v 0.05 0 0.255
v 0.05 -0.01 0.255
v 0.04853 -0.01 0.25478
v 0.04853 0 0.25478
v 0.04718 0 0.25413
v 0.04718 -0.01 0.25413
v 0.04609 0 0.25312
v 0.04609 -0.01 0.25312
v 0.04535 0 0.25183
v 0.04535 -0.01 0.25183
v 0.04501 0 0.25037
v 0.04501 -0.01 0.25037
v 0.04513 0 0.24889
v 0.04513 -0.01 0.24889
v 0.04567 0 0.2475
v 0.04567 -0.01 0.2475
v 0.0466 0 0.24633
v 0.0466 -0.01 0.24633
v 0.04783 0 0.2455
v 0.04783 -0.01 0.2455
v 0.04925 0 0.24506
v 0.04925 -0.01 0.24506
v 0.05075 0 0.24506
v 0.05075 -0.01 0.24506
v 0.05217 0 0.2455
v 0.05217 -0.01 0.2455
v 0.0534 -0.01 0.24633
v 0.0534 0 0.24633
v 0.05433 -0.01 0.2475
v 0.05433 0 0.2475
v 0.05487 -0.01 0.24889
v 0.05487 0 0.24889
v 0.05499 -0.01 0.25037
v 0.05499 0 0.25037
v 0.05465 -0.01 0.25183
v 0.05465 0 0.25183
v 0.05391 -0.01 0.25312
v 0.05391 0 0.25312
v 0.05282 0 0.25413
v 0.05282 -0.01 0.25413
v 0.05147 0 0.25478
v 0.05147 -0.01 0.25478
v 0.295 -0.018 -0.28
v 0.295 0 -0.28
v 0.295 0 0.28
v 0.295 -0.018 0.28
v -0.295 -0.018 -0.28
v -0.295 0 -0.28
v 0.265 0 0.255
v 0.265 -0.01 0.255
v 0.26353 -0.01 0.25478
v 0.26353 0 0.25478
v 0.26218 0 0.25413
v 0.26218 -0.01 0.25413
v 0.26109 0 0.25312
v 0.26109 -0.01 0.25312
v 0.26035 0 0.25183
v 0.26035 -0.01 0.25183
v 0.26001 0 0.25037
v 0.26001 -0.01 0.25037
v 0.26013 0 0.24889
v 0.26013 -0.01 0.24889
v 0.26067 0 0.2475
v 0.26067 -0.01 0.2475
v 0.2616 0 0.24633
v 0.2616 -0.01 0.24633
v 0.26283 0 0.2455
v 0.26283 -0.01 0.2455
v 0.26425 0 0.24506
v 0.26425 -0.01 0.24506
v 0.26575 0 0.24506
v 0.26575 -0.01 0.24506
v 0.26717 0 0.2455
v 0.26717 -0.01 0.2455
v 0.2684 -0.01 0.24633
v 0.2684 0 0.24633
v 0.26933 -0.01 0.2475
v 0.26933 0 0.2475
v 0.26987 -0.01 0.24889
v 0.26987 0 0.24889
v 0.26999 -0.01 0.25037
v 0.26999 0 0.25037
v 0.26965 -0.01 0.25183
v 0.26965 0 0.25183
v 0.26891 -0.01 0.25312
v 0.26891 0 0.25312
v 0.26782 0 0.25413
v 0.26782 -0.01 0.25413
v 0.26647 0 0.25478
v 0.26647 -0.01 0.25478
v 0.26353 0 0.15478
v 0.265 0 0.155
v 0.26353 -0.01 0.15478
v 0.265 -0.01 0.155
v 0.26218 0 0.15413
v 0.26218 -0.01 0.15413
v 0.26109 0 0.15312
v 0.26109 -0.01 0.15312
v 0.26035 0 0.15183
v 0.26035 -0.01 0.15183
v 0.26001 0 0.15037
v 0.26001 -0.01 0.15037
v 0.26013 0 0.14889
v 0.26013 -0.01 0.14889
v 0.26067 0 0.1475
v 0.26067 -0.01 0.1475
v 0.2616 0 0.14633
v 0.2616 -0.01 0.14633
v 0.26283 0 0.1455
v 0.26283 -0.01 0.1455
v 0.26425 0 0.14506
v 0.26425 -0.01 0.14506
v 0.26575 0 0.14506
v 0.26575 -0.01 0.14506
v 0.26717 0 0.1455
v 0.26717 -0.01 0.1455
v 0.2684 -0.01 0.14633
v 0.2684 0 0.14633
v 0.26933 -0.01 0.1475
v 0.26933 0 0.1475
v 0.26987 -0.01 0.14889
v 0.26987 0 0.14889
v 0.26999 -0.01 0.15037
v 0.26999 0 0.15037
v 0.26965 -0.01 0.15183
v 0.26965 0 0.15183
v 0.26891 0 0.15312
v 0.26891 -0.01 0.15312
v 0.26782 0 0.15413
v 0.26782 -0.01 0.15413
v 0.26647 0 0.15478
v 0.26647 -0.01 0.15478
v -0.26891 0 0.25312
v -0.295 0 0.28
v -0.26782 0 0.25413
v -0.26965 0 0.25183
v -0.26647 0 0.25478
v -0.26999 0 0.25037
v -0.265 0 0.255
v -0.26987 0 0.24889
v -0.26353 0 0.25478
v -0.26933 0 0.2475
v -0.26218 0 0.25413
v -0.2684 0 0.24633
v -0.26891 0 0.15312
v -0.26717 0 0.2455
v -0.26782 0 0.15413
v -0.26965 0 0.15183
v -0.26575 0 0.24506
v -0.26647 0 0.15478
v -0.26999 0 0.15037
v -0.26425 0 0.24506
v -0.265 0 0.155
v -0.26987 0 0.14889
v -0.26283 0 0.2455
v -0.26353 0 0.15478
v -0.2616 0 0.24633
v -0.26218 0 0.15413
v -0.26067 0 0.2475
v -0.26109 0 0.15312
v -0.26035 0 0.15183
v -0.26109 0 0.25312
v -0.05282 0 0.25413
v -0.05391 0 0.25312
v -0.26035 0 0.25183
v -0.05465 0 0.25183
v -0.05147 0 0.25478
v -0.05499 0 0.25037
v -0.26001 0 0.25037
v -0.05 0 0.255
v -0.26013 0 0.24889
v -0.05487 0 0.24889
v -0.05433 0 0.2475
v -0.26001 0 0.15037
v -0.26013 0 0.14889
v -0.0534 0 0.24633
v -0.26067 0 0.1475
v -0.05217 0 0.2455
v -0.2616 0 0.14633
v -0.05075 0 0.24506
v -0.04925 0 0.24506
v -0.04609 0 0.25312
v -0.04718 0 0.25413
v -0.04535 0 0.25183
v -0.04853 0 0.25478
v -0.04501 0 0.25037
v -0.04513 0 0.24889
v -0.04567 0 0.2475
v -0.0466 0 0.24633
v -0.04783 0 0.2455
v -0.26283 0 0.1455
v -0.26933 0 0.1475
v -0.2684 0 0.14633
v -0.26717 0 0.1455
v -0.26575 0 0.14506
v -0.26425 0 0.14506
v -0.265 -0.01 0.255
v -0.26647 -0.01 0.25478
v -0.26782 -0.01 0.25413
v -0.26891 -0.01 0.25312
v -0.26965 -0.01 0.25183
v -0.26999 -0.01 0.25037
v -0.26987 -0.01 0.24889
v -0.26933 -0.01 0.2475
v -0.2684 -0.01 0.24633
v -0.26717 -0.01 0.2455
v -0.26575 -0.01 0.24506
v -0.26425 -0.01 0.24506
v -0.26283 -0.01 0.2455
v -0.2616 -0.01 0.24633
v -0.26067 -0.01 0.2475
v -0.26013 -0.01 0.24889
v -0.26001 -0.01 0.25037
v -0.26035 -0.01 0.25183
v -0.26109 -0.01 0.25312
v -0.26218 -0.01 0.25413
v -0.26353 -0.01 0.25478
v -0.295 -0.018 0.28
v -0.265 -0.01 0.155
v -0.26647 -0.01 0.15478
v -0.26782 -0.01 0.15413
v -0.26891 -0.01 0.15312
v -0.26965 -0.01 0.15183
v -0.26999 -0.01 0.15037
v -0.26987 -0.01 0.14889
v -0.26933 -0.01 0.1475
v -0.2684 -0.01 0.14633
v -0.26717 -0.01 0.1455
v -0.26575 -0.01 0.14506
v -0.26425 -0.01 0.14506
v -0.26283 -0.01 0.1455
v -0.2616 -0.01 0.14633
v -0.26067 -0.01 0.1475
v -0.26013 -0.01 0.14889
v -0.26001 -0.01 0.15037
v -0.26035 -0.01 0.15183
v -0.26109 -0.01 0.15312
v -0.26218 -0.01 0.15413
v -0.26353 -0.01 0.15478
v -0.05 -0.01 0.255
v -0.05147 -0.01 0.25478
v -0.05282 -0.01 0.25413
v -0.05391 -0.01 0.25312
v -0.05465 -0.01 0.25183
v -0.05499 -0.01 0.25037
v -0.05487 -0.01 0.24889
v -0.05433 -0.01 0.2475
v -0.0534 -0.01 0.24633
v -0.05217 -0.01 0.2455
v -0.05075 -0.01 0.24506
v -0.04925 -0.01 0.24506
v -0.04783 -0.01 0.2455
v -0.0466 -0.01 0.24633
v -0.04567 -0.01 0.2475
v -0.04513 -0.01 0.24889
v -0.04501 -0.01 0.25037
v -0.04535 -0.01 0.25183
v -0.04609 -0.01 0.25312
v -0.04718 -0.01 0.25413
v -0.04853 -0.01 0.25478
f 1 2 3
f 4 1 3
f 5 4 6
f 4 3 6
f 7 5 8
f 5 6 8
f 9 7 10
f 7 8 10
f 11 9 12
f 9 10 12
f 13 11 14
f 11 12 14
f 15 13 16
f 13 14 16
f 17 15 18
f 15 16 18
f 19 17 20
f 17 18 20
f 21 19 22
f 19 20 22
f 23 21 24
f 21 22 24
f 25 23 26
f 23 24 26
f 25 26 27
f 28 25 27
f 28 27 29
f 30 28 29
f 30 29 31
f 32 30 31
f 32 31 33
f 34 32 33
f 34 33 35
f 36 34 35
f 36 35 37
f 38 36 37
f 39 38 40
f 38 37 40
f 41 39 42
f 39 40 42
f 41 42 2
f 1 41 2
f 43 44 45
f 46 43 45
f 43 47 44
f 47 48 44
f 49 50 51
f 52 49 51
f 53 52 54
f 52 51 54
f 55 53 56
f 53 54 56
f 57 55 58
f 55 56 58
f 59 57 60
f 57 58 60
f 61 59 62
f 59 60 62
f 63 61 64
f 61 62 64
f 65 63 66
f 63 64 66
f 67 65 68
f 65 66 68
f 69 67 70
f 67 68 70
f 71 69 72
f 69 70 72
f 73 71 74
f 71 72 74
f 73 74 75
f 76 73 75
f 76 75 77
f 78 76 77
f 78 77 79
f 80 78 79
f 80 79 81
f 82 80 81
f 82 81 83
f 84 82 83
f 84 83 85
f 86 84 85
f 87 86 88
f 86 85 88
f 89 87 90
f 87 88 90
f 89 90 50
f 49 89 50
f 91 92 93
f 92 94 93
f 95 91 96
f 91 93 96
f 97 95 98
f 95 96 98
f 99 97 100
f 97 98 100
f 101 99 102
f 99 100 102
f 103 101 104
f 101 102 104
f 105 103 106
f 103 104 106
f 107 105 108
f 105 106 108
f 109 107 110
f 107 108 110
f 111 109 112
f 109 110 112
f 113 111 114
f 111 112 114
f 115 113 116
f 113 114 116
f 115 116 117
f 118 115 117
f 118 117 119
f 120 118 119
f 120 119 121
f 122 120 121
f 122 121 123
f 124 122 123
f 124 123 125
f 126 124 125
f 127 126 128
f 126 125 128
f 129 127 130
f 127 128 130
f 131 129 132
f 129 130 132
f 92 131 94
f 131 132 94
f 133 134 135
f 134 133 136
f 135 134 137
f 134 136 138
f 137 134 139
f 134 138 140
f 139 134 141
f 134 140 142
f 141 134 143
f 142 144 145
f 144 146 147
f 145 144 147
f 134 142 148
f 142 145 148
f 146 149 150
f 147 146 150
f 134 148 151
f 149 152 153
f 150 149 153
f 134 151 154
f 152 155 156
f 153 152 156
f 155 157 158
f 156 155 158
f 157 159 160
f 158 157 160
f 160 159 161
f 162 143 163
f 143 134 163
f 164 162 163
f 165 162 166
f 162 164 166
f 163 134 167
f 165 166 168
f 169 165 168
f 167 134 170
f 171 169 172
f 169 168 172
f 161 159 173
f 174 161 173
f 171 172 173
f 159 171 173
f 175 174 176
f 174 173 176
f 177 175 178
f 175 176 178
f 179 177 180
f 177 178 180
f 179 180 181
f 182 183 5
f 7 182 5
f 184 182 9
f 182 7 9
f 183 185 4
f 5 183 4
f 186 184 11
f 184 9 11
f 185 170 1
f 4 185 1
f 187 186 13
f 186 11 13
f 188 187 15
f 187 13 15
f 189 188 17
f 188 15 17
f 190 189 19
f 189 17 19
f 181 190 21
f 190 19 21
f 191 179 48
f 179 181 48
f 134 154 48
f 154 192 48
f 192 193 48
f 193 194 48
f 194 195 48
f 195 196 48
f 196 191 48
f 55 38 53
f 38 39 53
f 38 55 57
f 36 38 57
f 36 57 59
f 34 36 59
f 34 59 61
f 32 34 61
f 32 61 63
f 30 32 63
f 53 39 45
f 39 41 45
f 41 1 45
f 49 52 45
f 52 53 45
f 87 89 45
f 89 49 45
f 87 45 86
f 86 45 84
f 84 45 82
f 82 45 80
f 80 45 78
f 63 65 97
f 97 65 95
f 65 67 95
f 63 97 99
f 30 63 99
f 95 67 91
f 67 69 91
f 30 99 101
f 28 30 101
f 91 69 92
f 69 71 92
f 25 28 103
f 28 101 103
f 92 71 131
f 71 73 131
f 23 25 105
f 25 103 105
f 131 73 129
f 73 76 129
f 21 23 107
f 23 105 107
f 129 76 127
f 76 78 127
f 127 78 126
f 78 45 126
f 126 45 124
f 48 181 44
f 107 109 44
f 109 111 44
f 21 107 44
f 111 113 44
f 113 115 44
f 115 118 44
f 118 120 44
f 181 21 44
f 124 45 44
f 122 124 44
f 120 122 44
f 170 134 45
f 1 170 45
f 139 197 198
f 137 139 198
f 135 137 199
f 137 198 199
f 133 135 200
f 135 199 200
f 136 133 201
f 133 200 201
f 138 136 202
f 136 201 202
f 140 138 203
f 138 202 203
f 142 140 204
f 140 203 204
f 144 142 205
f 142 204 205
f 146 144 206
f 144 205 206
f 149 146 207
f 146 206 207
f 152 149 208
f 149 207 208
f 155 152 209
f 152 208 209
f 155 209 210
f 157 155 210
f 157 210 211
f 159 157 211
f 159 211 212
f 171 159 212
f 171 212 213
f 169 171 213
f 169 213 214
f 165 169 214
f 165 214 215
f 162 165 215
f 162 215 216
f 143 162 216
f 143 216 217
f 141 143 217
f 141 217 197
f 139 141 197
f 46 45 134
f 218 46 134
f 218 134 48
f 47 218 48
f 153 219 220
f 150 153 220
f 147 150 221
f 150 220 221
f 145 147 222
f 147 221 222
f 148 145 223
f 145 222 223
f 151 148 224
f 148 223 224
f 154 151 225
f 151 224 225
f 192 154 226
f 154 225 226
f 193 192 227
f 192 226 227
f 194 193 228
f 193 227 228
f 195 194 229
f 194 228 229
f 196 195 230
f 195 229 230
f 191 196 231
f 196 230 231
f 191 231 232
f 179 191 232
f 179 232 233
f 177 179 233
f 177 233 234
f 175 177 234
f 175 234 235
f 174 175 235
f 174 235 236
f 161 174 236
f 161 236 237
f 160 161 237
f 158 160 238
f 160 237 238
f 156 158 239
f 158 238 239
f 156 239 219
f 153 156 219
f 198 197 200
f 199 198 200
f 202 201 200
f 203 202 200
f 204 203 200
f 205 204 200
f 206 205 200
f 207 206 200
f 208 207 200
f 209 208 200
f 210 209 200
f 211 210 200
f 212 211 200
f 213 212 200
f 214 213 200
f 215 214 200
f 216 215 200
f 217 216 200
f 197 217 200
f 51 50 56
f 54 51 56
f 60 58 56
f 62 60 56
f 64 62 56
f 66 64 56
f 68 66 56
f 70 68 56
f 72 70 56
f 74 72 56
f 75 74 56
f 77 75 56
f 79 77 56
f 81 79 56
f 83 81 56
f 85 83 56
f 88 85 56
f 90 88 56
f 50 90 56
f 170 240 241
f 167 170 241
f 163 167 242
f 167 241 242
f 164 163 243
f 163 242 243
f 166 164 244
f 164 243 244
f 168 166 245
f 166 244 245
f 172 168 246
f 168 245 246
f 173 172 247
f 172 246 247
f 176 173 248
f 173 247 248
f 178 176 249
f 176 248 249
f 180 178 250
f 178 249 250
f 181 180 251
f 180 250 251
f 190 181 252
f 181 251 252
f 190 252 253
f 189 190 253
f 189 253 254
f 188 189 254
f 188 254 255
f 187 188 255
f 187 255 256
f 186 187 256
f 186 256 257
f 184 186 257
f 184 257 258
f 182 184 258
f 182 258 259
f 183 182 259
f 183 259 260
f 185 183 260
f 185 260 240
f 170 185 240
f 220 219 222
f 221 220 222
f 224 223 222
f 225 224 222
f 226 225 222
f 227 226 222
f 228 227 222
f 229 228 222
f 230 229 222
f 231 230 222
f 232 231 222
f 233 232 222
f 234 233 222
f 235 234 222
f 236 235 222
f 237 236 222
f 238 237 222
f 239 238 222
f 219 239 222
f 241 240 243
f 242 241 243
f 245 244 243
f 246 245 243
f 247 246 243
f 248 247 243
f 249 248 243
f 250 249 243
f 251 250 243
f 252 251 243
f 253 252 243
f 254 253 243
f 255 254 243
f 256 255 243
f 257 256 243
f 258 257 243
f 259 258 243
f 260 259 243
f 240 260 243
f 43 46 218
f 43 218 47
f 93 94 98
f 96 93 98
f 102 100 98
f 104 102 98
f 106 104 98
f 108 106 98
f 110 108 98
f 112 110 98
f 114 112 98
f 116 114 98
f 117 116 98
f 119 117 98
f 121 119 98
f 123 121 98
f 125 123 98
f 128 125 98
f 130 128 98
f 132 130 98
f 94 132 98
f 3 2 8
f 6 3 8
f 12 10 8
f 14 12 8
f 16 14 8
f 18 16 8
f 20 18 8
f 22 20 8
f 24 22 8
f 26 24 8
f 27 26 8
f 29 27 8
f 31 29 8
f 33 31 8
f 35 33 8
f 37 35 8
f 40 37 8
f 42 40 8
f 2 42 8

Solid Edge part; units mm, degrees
sketch "Sketch1" plane through (0, 0, 0) normal (0, -1, 0) x (1, 0, 0)
  line L0 (-0.295, -0.28) -> (0.295, -0.28)
  line L1 (0.295, -0.28) -> (0.295, 0.28)
  line L2 (0.295, 0.28) -> (-0.295, 0.28)
  line L3 (-0.295, 0.28) -> (-0.295, -0.28)
  dimension "D1" = 0.56
  dimension "D2" = 0.59
extrude "Protrusion1" add sketch "Sketch1" along normal blind 0.018
hole "Bohrung_1" at (-0.05, 0, 0.25) direction (0, -1, 0) diameter 0.01 depth 0.01
hole "Hole1" at (0.05, 0, 0.25) direction (0, -1, 0) diameter 0.01 depth 0.01
hole "Hole2" at (0.265, 0, 0.25) direction (0, -1, 0) diameter 0.01 depth 0.01
hole "Hole3" at (0.265, 0, 0.15) direction (0, -1, 0) diameter 0.01 depth 0.01
hole "Hole4" at (-0.265, 0, 0.15) direction (0, -1, 0) diameter 0.01 depth 0.01
hole "Hole5" at (-0.265, 0, 0.25) direction (0, -1, 0) diameter 0.01 depth 0.01
